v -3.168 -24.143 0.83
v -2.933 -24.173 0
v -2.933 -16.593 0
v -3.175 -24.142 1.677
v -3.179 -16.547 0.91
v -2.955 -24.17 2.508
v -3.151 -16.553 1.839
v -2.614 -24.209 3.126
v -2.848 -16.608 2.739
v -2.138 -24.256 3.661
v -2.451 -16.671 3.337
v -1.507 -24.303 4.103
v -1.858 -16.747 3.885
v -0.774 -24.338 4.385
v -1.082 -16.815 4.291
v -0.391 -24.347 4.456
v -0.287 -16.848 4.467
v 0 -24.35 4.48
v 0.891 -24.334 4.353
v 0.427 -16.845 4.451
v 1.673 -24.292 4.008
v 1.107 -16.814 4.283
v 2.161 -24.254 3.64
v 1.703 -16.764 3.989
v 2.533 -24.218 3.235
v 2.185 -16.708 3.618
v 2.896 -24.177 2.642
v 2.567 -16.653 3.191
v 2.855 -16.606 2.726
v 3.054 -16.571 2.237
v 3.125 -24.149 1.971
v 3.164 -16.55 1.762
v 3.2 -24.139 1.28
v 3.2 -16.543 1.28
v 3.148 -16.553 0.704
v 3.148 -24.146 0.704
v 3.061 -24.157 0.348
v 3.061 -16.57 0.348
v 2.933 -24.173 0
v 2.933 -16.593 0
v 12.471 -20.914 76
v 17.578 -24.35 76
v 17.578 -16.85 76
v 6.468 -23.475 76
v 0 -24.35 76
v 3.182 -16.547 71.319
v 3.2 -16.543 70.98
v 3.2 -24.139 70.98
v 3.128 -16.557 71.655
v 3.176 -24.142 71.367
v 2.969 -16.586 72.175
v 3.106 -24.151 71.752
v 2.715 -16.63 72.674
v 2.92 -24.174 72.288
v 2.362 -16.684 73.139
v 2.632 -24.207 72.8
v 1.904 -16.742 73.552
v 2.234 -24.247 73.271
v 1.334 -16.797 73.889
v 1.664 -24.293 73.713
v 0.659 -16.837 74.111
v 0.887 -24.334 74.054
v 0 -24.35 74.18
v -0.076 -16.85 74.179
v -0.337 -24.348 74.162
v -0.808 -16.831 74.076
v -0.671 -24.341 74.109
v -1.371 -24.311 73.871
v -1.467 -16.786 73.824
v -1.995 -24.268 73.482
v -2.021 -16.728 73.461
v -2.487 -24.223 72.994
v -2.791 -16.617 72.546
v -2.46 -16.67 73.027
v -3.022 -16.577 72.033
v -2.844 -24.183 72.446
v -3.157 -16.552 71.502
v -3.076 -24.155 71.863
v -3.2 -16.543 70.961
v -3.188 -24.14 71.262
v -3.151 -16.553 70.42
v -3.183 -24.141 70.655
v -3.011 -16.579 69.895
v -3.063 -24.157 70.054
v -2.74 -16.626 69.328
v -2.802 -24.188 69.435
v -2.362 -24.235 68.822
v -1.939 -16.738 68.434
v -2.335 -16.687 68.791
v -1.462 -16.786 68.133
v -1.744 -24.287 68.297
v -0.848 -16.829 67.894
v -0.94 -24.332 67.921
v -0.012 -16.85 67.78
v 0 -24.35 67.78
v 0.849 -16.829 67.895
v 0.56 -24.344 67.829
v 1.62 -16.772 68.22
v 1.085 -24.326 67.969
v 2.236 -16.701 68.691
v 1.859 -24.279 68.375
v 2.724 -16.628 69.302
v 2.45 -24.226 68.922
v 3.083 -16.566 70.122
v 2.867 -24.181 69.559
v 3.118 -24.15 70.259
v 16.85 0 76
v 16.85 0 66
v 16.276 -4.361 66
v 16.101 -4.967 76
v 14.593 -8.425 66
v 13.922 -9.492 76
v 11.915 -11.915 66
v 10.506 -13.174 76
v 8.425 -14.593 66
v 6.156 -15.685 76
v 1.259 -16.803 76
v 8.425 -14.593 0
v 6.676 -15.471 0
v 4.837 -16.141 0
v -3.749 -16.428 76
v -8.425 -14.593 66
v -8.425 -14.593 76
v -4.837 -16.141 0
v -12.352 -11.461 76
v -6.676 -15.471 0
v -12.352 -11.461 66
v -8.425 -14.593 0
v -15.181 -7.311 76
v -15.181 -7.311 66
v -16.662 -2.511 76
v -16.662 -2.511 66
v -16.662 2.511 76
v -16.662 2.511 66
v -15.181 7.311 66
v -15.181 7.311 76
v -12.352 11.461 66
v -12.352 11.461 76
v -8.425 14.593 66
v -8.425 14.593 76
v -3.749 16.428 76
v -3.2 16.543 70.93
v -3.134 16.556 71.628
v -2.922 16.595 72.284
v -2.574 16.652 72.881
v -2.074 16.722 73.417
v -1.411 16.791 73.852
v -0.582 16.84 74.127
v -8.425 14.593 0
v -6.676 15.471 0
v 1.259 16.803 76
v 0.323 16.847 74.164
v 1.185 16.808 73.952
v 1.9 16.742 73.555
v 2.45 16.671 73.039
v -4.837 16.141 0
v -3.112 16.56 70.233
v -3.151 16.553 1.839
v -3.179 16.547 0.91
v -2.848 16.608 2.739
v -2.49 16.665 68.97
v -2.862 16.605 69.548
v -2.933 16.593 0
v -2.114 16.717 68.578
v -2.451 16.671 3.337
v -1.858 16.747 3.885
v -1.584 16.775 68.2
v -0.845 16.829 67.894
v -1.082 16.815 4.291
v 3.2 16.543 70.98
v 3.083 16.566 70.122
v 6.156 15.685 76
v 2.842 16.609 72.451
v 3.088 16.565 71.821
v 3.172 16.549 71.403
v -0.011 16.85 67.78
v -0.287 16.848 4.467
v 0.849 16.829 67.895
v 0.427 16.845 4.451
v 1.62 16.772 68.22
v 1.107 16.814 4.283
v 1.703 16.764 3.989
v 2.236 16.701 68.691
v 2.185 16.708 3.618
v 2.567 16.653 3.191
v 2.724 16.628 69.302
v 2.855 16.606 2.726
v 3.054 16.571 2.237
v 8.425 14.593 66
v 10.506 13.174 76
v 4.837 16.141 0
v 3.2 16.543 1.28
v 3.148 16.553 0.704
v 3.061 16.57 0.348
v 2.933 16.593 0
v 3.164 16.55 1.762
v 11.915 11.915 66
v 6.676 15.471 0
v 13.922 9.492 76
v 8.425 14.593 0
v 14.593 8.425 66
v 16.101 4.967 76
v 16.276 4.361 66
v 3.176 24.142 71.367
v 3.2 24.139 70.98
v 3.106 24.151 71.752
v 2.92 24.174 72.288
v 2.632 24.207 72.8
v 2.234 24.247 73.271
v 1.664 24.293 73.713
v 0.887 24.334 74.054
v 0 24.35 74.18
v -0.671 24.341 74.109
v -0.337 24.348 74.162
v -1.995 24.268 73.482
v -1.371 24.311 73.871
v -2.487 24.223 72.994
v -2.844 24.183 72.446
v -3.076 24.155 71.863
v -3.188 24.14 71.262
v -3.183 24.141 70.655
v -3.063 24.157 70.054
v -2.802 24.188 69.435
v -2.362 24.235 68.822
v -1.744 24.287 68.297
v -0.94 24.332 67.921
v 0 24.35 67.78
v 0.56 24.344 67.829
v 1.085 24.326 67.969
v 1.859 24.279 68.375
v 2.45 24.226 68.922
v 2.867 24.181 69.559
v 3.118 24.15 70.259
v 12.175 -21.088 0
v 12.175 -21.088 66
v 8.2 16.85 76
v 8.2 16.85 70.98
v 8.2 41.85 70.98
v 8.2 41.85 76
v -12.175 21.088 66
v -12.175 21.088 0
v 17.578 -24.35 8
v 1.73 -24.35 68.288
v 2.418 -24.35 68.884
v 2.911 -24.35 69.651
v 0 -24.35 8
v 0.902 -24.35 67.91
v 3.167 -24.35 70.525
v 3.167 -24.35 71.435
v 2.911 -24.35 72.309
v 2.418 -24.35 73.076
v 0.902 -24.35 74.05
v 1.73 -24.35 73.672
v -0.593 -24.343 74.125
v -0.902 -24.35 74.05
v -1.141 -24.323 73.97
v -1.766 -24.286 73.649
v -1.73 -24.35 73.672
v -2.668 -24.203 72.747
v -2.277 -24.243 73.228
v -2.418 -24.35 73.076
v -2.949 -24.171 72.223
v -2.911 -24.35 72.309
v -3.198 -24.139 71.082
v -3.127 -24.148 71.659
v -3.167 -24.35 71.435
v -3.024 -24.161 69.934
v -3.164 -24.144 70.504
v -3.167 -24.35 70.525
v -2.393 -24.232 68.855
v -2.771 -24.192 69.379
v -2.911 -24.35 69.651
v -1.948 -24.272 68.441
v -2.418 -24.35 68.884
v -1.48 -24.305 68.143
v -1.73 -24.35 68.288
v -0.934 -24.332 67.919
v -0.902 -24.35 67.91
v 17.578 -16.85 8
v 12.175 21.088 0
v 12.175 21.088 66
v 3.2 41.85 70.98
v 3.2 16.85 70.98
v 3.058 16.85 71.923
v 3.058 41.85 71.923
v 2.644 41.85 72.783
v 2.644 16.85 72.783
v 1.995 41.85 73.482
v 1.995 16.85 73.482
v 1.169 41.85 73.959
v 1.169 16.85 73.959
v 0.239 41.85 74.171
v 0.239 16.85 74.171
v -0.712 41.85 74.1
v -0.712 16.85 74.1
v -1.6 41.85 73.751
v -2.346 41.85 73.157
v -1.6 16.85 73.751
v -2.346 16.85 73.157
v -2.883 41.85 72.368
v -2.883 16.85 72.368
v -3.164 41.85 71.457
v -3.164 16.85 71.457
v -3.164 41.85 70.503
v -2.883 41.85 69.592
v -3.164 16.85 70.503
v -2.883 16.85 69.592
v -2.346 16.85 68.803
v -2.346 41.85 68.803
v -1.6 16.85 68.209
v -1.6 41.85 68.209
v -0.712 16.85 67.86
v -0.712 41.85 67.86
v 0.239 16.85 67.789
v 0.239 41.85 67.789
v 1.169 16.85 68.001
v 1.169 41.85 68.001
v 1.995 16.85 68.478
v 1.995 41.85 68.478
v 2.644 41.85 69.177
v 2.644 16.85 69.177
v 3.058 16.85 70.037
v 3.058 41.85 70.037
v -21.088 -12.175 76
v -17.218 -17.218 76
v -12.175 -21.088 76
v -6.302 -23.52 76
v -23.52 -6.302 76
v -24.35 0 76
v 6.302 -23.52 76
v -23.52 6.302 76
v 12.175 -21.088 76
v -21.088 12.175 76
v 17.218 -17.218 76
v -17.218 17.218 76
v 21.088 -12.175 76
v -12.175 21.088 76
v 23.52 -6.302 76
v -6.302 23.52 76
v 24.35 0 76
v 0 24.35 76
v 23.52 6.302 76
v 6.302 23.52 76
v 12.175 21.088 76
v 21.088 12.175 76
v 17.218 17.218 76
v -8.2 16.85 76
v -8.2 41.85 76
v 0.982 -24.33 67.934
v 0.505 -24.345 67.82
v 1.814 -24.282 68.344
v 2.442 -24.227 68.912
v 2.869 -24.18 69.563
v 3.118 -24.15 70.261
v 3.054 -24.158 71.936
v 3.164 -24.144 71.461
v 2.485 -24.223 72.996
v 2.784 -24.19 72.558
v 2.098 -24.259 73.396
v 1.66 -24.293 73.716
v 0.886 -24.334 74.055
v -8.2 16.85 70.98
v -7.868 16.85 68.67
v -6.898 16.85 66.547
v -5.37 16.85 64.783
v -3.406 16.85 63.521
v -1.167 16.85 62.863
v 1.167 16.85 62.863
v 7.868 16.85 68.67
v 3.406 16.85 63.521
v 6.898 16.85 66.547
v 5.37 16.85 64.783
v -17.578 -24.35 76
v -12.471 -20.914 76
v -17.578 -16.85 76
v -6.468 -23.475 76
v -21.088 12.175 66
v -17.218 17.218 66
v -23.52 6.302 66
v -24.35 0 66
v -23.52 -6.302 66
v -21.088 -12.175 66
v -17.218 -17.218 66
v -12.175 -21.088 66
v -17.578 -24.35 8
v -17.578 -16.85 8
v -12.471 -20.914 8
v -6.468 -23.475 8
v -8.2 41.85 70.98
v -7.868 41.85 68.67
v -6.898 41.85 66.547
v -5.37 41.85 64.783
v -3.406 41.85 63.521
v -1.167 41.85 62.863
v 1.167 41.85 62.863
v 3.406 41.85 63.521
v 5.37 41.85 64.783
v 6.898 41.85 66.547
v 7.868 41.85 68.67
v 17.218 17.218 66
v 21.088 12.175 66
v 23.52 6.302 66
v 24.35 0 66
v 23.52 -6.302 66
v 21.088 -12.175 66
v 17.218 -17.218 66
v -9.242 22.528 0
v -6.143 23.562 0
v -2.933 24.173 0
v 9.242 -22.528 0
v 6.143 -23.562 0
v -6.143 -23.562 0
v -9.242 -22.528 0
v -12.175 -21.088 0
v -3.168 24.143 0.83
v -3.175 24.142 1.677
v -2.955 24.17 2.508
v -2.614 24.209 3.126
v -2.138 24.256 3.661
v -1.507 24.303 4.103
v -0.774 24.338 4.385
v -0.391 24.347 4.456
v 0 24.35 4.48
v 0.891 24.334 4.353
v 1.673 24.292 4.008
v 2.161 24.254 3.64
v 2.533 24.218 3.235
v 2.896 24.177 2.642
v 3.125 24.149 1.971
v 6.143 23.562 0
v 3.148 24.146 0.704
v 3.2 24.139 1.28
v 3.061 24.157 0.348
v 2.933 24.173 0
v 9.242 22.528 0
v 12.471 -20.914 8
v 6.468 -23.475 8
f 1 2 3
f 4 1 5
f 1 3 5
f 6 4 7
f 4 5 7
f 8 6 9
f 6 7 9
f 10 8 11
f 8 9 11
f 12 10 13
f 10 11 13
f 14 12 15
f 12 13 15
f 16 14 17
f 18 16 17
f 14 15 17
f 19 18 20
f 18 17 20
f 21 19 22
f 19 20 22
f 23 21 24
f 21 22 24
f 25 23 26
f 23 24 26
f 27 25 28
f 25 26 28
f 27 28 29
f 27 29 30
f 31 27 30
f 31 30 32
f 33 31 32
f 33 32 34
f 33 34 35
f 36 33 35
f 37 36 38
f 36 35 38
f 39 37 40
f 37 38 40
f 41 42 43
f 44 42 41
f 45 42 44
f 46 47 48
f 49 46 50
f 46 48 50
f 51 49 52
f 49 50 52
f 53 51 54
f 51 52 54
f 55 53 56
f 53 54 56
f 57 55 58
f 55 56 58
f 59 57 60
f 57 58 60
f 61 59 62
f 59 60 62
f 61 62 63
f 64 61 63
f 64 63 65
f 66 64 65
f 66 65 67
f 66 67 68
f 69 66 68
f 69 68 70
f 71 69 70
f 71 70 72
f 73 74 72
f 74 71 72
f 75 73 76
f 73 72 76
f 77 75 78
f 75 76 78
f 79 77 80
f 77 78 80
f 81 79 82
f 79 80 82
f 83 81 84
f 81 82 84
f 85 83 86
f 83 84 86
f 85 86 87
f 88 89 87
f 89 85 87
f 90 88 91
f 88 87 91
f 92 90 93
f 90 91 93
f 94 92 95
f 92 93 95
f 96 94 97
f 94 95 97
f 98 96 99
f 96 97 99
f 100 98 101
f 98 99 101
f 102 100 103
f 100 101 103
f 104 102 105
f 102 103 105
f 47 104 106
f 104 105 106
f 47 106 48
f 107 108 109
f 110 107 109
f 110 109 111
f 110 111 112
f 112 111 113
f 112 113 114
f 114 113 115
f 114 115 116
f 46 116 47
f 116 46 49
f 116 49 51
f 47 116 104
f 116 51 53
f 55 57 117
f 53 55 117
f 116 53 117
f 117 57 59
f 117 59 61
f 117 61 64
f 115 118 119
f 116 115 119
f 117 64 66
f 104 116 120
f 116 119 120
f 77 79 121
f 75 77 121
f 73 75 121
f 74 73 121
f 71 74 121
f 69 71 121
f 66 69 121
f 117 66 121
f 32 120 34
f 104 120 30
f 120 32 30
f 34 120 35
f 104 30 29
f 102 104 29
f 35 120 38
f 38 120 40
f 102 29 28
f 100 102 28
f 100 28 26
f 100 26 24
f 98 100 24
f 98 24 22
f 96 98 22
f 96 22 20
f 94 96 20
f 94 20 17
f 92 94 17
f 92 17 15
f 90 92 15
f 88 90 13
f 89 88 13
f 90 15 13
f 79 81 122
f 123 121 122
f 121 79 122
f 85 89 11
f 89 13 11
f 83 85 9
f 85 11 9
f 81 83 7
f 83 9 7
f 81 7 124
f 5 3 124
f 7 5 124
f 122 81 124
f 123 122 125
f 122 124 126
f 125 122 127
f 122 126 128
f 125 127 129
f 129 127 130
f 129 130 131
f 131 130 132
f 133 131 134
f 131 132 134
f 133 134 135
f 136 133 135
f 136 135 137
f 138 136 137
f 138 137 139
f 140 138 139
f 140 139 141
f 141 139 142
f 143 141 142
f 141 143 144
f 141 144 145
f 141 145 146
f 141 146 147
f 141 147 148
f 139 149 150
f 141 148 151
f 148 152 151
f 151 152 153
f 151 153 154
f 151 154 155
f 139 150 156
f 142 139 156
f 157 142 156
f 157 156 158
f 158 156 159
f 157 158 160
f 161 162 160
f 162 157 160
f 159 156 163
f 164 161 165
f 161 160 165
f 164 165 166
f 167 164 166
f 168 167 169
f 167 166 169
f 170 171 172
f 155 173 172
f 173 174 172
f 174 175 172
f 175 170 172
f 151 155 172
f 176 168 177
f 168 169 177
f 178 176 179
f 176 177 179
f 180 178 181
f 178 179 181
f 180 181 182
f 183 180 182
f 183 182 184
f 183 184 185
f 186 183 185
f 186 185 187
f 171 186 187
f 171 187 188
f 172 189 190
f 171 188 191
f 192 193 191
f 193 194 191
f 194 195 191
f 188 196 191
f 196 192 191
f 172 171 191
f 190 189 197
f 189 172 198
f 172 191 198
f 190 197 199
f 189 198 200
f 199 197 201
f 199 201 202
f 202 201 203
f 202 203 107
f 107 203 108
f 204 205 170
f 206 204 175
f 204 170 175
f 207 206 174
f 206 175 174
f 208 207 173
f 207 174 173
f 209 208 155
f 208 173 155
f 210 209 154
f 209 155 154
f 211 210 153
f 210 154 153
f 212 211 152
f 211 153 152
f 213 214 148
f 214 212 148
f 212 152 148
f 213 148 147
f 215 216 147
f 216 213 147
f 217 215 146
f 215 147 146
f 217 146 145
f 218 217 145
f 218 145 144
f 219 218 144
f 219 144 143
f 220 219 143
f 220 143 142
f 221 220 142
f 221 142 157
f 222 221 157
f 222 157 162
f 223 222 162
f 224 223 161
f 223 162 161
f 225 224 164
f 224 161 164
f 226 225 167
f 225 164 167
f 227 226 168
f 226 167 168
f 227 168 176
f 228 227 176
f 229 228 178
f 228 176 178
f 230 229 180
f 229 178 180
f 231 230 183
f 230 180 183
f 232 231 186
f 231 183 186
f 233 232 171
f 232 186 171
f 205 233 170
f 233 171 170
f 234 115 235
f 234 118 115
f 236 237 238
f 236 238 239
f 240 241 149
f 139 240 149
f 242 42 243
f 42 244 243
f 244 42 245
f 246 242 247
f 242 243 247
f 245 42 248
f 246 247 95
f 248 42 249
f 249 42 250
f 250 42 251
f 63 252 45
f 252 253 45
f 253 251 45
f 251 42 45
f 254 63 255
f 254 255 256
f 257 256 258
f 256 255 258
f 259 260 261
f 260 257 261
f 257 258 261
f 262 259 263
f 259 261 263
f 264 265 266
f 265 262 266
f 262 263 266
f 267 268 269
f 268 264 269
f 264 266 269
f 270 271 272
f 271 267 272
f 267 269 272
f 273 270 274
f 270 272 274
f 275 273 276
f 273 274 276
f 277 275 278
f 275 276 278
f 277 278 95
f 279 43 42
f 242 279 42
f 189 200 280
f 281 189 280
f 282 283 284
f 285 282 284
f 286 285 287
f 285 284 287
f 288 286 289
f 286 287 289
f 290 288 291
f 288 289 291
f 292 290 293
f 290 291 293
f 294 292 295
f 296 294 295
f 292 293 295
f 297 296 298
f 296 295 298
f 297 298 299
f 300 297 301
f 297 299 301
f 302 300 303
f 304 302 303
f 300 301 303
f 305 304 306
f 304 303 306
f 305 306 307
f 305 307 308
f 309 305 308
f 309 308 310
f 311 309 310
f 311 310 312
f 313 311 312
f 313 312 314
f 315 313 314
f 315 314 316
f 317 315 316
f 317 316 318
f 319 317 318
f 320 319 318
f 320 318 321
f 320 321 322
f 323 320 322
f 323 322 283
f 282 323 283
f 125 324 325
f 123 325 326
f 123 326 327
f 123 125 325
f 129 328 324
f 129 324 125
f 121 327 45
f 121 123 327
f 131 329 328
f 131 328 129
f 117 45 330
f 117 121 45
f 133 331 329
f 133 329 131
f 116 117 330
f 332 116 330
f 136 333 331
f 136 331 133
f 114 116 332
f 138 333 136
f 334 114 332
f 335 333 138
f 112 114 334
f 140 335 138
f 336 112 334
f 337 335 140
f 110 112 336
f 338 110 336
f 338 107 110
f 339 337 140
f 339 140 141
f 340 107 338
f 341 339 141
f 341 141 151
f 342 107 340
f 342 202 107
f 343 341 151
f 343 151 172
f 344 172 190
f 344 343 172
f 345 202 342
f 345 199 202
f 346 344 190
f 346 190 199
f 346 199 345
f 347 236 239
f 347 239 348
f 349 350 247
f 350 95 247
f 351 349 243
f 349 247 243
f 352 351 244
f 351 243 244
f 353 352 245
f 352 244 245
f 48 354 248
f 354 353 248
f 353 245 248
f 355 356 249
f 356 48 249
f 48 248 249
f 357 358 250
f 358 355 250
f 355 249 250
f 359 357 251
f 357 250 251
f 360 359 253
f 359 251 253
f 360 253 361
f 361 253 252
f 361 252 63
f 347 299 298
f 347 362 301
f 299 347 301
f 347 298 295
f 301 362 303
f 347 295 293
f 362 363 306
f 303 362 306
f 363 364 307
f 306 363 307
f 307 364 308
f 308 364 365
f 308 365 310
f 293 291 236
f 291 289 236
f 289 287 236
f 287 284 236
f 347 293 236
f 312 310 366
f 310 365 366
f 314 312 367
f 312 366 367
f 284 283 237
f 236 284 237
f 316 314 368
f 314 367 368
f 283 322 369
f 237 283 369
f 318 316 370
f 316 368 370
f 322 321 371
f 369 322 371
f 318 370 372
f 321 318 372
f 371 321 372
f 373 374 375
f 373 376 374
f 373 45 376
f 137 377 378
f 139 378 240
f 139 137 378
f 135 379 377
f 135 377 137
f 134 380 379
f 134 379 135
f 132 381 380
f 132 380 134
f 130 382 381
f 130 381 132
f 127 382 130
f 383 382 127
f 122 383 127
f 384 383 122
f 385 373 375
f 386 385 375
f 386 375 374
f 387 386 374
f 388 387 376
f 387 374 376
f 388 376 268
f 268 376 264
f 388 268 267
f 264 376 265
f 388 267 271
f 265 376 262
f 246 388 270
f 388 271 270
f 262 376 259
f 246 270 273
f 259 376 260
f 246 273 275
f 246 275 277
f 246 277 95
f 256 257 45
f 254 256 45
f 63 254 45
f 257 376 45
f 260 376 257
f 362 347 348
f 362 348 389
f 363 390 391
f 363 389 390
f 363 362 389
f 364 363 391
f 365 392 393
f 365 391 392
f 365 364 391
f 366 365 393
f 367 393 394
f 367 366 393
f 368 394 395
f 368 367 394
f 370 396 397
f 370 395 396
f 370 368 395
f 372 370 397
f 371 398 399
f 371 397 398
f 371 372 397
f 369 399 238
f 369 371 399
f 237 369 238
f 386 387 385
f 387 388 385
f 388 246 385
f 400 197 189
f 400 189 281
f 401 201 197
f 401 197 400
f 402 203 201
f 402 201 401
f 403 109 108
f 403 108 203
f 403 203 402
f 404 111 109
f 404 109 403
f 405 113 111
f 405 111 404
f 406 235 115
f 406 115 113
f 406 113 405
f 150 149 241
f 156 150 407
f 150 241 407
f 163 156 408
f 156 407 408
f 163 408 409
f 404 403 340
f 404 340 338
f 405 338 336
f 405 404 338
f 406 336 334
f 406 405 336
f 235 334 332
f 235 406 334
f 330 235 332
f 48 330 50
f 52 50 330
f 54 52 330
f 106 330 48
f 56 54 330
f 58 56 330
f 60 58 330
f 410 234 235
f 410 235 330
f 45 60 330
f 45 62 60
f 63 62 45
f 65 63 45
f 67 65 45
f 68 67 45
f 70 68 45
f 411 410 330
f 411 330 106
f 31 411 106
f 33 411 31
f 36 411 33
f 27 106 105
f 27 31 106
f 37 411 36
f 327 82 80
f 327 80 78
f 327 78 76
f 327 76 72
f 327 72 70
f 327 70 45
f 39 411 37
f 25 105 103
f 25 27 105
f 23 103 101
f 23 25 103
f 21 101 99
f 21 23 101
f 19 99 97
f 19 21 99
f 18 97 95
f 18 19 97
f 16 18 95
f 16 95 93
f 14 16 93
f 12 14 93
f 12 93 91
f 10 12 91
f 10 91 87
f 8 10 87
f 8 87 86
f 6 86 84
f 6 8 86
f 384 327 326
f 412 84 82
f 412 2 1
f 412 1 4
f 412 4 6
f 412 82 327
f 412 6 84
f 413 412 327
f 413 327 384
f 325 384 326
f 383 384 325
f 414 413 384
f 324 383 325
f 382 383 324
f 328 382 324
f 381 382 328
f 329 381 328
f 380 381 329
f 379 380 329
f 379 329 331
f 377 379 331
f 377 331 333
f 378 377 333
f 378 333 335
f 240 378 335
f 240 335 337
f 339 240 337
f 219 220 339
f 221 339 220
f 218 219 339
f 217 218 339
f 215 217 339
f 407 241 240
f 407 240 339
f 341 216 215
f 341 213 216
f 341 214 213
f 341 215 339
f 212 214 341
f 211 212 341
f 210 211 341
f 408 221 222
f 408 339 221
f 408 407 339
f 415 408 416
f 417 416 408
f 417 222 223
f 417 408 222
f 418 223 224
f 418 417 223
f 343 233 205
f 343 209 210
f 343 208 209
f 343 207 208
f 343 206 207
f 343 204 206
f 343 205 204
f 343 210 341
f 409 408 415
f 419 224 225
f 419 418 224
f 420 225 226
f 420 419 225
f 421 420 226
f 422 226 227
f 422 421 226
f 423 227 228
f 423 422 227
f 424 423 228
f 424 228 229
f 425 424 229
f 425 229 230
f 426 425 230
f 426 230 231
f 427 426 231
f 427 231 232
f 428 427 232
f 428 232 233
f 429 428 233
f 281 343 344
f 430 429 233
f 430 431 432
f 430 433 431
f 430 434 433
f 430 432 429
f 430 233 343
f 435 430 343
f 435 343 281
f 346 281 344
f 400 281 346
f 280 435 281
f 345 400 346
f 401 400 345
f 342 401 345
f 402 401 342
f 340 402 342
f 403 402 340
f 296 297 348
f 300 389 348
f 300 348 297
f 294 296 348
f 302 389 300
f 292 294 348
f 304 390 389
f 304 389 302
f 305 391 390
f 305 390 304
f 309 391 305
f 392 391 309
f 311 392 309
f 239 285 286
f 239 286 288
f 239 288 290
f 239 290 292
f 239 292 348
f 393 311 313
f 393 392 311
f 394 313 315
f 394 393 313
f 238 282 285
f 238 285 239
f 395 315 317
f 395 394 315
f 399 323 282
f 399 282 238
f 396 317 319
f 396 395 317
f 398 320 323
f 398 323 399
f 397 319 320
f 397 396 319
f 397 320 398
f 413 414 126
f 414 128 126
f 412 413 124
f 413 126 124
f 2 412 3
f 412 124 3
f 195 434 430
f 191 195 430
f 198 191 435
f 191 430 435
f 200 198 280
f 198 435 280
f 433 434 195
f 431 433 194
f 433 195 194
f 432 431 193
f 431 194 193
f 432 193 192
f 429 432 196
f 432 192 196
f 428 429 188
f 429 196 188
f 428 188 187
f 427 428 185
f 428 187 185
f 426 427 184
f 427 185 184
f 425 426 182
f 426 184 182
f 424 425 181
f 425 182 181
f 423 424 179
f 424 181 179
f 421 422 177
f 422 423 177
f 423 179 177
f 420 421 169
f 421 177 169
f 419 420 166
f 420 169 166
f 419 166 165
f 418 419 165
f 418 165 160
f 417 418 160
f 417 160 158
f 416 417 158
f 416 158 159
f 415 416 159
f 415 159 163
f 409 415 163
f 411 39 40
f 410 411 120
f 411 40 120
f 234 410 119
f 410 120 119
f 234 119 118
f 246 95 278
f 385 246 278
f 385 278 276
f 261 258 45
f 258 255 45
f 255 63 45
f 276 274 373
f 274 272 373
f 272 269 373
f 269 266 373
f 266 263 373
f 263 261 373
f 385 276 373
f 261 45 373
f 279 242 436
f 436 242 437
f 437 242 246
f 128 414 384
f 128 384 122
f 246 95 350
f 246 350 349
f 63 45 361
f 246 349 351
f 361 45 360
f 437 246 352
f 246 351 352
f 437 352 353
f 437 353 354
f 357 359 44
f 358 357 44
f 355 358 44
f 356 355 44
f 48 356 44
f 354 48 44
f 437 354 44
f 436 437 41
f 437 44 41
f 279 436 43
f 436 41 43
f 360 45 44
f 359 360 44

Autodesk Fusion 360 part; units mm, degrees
sketch "Main Body" plane through (0, 0, 0) normal (0, 0, 1) x (1, 0, 0)
  circle A0 centre (0, 0) radius 16.85
  circle A1 centre (0, 0) radius 24.35
  dimension "d1" = 33.7
  dimension "d2" = 48.7
extrude "Extrude1" add sketch "Main Body" along normal blind 76 makes body 1
sketch "Cut Guide" plane through (0, 0, 0) normal (0, 1, 0) x (1, 0, 0)
  circle A0 centre (0, -1.28) radius 3.2
  circle A1 centre (0, -70.98) radius 3.2
  circle A2 centre (0, -70.98) radius 8.2
  line L0 (-8.2, -70.98) -> (8.2, -70.98)
  line L1 (8.2, -70.98) -> (8.2, -76)
  line L2 (8.2, -76) -> (-8.2, -76)
  line L3 (-8.2, -76) -> (-8.2, -70.98)
  point P0 (0, -41.6319)
  dimension "d5" = 6.4
  dimension "d6" = 1.28
  dimension "d11" = 6.4
  dimension "d12" = 69.7
  dimension "d13" = 16.4
  dimension "d33" = 5.02
extrude "Extrude2" cut sketch "Cut Guide" along normal blind 24.35 and the other way blind 24.35 contours A0 bodies 1
extrude "Extrude3" add sketch "Cut Guide" along normal blind 25 from surface at 16.85 separate body contours A1 A2 L0 L2 | A1 A2 L0 | A2 L1 L2 | A2 L2 L3 makes body 2
sketch "Side Removal" plane through (0, 0, 0) normal (0, 0, -1) x (1, 0, 0)
  line L0 (-2.9328, 16.5928) -> (-2.9328, 24.1727)
  arc A0 (-2.9328, 24.1727) -> (-2.9328, -24.1727) centre (0, 0) ccw
  line L1 (-2.9328, -24.1727) -> (-2.9328, -16.5928)
  arc A1 (-2.9328, 16.5928) -> (-2.9328, -16.5928) centre (0, 0) ccw
  line L2 (-12.175, -21.0877) -> (12.175, 21.0877)
  arc A2 (2.9328, -24.1727) -> (2.9328, 24.1727) centre (0, 0) ccw
  line L3 (-12.175, 21.0877) -> (12.175, -21.0877)
  dimension "d19" = 120
extrude "Extrude4" cut sketch "Side Removal" against normal blind 66 contours L2 A2 L3 | A1 L2 L3 | A0 A1 L2 L3 bodies 1
sketch "Flat Bottom" plane through (0, 0, 76) normal (0, 0, 1) x (-1, 0, 0)
  circle A0 centre (0, 0) radius 16.85
  circle A1 centre (0, 0) radius 24.35
  line L0 (17.5784, 16.85) -> (-17.5784, 16.85)
  line L1 (-17.5784, 16.85) -> (-17.5784, 24.35)
  line L2 (-17.5784, 24.35) -> (17.5784, 24.35)
  line L3 (17.5784, 24.35) -> (17.5784, 16.85)
extrude "Extrude6" add sketch "Flat Bottom" against normal blind 68 separate body contours A1 L2 L3 | A1 L1 L2 makes body 3 at (-13.3955, -20.3343, 30.6667)
extrude "Extrude7" cut sketch "Cut Guide" along normal blind 24.35 and the other way blind 24.35 contours A1 L0 | A1 L0 bodies 1 3
equation "d2 = d1 + 15 mm"
equation "d3 = 76 mm"
equation "d6 = d5 / 5"
equation "d7 = d2 / 2"
equation "d9 = d2 / 2"
equation "d13 = d11 + 10 mm"
equation "d16 = ( d1 ) / 2"
equation "d21 = -( d3 - 10 mm )"
equation "d27 = -d3 + 8 mm"
equation "d29 = d2 / 2"
equation "d31 = d2 / 2"
equation "d33 = d3 - d12 - d6"
